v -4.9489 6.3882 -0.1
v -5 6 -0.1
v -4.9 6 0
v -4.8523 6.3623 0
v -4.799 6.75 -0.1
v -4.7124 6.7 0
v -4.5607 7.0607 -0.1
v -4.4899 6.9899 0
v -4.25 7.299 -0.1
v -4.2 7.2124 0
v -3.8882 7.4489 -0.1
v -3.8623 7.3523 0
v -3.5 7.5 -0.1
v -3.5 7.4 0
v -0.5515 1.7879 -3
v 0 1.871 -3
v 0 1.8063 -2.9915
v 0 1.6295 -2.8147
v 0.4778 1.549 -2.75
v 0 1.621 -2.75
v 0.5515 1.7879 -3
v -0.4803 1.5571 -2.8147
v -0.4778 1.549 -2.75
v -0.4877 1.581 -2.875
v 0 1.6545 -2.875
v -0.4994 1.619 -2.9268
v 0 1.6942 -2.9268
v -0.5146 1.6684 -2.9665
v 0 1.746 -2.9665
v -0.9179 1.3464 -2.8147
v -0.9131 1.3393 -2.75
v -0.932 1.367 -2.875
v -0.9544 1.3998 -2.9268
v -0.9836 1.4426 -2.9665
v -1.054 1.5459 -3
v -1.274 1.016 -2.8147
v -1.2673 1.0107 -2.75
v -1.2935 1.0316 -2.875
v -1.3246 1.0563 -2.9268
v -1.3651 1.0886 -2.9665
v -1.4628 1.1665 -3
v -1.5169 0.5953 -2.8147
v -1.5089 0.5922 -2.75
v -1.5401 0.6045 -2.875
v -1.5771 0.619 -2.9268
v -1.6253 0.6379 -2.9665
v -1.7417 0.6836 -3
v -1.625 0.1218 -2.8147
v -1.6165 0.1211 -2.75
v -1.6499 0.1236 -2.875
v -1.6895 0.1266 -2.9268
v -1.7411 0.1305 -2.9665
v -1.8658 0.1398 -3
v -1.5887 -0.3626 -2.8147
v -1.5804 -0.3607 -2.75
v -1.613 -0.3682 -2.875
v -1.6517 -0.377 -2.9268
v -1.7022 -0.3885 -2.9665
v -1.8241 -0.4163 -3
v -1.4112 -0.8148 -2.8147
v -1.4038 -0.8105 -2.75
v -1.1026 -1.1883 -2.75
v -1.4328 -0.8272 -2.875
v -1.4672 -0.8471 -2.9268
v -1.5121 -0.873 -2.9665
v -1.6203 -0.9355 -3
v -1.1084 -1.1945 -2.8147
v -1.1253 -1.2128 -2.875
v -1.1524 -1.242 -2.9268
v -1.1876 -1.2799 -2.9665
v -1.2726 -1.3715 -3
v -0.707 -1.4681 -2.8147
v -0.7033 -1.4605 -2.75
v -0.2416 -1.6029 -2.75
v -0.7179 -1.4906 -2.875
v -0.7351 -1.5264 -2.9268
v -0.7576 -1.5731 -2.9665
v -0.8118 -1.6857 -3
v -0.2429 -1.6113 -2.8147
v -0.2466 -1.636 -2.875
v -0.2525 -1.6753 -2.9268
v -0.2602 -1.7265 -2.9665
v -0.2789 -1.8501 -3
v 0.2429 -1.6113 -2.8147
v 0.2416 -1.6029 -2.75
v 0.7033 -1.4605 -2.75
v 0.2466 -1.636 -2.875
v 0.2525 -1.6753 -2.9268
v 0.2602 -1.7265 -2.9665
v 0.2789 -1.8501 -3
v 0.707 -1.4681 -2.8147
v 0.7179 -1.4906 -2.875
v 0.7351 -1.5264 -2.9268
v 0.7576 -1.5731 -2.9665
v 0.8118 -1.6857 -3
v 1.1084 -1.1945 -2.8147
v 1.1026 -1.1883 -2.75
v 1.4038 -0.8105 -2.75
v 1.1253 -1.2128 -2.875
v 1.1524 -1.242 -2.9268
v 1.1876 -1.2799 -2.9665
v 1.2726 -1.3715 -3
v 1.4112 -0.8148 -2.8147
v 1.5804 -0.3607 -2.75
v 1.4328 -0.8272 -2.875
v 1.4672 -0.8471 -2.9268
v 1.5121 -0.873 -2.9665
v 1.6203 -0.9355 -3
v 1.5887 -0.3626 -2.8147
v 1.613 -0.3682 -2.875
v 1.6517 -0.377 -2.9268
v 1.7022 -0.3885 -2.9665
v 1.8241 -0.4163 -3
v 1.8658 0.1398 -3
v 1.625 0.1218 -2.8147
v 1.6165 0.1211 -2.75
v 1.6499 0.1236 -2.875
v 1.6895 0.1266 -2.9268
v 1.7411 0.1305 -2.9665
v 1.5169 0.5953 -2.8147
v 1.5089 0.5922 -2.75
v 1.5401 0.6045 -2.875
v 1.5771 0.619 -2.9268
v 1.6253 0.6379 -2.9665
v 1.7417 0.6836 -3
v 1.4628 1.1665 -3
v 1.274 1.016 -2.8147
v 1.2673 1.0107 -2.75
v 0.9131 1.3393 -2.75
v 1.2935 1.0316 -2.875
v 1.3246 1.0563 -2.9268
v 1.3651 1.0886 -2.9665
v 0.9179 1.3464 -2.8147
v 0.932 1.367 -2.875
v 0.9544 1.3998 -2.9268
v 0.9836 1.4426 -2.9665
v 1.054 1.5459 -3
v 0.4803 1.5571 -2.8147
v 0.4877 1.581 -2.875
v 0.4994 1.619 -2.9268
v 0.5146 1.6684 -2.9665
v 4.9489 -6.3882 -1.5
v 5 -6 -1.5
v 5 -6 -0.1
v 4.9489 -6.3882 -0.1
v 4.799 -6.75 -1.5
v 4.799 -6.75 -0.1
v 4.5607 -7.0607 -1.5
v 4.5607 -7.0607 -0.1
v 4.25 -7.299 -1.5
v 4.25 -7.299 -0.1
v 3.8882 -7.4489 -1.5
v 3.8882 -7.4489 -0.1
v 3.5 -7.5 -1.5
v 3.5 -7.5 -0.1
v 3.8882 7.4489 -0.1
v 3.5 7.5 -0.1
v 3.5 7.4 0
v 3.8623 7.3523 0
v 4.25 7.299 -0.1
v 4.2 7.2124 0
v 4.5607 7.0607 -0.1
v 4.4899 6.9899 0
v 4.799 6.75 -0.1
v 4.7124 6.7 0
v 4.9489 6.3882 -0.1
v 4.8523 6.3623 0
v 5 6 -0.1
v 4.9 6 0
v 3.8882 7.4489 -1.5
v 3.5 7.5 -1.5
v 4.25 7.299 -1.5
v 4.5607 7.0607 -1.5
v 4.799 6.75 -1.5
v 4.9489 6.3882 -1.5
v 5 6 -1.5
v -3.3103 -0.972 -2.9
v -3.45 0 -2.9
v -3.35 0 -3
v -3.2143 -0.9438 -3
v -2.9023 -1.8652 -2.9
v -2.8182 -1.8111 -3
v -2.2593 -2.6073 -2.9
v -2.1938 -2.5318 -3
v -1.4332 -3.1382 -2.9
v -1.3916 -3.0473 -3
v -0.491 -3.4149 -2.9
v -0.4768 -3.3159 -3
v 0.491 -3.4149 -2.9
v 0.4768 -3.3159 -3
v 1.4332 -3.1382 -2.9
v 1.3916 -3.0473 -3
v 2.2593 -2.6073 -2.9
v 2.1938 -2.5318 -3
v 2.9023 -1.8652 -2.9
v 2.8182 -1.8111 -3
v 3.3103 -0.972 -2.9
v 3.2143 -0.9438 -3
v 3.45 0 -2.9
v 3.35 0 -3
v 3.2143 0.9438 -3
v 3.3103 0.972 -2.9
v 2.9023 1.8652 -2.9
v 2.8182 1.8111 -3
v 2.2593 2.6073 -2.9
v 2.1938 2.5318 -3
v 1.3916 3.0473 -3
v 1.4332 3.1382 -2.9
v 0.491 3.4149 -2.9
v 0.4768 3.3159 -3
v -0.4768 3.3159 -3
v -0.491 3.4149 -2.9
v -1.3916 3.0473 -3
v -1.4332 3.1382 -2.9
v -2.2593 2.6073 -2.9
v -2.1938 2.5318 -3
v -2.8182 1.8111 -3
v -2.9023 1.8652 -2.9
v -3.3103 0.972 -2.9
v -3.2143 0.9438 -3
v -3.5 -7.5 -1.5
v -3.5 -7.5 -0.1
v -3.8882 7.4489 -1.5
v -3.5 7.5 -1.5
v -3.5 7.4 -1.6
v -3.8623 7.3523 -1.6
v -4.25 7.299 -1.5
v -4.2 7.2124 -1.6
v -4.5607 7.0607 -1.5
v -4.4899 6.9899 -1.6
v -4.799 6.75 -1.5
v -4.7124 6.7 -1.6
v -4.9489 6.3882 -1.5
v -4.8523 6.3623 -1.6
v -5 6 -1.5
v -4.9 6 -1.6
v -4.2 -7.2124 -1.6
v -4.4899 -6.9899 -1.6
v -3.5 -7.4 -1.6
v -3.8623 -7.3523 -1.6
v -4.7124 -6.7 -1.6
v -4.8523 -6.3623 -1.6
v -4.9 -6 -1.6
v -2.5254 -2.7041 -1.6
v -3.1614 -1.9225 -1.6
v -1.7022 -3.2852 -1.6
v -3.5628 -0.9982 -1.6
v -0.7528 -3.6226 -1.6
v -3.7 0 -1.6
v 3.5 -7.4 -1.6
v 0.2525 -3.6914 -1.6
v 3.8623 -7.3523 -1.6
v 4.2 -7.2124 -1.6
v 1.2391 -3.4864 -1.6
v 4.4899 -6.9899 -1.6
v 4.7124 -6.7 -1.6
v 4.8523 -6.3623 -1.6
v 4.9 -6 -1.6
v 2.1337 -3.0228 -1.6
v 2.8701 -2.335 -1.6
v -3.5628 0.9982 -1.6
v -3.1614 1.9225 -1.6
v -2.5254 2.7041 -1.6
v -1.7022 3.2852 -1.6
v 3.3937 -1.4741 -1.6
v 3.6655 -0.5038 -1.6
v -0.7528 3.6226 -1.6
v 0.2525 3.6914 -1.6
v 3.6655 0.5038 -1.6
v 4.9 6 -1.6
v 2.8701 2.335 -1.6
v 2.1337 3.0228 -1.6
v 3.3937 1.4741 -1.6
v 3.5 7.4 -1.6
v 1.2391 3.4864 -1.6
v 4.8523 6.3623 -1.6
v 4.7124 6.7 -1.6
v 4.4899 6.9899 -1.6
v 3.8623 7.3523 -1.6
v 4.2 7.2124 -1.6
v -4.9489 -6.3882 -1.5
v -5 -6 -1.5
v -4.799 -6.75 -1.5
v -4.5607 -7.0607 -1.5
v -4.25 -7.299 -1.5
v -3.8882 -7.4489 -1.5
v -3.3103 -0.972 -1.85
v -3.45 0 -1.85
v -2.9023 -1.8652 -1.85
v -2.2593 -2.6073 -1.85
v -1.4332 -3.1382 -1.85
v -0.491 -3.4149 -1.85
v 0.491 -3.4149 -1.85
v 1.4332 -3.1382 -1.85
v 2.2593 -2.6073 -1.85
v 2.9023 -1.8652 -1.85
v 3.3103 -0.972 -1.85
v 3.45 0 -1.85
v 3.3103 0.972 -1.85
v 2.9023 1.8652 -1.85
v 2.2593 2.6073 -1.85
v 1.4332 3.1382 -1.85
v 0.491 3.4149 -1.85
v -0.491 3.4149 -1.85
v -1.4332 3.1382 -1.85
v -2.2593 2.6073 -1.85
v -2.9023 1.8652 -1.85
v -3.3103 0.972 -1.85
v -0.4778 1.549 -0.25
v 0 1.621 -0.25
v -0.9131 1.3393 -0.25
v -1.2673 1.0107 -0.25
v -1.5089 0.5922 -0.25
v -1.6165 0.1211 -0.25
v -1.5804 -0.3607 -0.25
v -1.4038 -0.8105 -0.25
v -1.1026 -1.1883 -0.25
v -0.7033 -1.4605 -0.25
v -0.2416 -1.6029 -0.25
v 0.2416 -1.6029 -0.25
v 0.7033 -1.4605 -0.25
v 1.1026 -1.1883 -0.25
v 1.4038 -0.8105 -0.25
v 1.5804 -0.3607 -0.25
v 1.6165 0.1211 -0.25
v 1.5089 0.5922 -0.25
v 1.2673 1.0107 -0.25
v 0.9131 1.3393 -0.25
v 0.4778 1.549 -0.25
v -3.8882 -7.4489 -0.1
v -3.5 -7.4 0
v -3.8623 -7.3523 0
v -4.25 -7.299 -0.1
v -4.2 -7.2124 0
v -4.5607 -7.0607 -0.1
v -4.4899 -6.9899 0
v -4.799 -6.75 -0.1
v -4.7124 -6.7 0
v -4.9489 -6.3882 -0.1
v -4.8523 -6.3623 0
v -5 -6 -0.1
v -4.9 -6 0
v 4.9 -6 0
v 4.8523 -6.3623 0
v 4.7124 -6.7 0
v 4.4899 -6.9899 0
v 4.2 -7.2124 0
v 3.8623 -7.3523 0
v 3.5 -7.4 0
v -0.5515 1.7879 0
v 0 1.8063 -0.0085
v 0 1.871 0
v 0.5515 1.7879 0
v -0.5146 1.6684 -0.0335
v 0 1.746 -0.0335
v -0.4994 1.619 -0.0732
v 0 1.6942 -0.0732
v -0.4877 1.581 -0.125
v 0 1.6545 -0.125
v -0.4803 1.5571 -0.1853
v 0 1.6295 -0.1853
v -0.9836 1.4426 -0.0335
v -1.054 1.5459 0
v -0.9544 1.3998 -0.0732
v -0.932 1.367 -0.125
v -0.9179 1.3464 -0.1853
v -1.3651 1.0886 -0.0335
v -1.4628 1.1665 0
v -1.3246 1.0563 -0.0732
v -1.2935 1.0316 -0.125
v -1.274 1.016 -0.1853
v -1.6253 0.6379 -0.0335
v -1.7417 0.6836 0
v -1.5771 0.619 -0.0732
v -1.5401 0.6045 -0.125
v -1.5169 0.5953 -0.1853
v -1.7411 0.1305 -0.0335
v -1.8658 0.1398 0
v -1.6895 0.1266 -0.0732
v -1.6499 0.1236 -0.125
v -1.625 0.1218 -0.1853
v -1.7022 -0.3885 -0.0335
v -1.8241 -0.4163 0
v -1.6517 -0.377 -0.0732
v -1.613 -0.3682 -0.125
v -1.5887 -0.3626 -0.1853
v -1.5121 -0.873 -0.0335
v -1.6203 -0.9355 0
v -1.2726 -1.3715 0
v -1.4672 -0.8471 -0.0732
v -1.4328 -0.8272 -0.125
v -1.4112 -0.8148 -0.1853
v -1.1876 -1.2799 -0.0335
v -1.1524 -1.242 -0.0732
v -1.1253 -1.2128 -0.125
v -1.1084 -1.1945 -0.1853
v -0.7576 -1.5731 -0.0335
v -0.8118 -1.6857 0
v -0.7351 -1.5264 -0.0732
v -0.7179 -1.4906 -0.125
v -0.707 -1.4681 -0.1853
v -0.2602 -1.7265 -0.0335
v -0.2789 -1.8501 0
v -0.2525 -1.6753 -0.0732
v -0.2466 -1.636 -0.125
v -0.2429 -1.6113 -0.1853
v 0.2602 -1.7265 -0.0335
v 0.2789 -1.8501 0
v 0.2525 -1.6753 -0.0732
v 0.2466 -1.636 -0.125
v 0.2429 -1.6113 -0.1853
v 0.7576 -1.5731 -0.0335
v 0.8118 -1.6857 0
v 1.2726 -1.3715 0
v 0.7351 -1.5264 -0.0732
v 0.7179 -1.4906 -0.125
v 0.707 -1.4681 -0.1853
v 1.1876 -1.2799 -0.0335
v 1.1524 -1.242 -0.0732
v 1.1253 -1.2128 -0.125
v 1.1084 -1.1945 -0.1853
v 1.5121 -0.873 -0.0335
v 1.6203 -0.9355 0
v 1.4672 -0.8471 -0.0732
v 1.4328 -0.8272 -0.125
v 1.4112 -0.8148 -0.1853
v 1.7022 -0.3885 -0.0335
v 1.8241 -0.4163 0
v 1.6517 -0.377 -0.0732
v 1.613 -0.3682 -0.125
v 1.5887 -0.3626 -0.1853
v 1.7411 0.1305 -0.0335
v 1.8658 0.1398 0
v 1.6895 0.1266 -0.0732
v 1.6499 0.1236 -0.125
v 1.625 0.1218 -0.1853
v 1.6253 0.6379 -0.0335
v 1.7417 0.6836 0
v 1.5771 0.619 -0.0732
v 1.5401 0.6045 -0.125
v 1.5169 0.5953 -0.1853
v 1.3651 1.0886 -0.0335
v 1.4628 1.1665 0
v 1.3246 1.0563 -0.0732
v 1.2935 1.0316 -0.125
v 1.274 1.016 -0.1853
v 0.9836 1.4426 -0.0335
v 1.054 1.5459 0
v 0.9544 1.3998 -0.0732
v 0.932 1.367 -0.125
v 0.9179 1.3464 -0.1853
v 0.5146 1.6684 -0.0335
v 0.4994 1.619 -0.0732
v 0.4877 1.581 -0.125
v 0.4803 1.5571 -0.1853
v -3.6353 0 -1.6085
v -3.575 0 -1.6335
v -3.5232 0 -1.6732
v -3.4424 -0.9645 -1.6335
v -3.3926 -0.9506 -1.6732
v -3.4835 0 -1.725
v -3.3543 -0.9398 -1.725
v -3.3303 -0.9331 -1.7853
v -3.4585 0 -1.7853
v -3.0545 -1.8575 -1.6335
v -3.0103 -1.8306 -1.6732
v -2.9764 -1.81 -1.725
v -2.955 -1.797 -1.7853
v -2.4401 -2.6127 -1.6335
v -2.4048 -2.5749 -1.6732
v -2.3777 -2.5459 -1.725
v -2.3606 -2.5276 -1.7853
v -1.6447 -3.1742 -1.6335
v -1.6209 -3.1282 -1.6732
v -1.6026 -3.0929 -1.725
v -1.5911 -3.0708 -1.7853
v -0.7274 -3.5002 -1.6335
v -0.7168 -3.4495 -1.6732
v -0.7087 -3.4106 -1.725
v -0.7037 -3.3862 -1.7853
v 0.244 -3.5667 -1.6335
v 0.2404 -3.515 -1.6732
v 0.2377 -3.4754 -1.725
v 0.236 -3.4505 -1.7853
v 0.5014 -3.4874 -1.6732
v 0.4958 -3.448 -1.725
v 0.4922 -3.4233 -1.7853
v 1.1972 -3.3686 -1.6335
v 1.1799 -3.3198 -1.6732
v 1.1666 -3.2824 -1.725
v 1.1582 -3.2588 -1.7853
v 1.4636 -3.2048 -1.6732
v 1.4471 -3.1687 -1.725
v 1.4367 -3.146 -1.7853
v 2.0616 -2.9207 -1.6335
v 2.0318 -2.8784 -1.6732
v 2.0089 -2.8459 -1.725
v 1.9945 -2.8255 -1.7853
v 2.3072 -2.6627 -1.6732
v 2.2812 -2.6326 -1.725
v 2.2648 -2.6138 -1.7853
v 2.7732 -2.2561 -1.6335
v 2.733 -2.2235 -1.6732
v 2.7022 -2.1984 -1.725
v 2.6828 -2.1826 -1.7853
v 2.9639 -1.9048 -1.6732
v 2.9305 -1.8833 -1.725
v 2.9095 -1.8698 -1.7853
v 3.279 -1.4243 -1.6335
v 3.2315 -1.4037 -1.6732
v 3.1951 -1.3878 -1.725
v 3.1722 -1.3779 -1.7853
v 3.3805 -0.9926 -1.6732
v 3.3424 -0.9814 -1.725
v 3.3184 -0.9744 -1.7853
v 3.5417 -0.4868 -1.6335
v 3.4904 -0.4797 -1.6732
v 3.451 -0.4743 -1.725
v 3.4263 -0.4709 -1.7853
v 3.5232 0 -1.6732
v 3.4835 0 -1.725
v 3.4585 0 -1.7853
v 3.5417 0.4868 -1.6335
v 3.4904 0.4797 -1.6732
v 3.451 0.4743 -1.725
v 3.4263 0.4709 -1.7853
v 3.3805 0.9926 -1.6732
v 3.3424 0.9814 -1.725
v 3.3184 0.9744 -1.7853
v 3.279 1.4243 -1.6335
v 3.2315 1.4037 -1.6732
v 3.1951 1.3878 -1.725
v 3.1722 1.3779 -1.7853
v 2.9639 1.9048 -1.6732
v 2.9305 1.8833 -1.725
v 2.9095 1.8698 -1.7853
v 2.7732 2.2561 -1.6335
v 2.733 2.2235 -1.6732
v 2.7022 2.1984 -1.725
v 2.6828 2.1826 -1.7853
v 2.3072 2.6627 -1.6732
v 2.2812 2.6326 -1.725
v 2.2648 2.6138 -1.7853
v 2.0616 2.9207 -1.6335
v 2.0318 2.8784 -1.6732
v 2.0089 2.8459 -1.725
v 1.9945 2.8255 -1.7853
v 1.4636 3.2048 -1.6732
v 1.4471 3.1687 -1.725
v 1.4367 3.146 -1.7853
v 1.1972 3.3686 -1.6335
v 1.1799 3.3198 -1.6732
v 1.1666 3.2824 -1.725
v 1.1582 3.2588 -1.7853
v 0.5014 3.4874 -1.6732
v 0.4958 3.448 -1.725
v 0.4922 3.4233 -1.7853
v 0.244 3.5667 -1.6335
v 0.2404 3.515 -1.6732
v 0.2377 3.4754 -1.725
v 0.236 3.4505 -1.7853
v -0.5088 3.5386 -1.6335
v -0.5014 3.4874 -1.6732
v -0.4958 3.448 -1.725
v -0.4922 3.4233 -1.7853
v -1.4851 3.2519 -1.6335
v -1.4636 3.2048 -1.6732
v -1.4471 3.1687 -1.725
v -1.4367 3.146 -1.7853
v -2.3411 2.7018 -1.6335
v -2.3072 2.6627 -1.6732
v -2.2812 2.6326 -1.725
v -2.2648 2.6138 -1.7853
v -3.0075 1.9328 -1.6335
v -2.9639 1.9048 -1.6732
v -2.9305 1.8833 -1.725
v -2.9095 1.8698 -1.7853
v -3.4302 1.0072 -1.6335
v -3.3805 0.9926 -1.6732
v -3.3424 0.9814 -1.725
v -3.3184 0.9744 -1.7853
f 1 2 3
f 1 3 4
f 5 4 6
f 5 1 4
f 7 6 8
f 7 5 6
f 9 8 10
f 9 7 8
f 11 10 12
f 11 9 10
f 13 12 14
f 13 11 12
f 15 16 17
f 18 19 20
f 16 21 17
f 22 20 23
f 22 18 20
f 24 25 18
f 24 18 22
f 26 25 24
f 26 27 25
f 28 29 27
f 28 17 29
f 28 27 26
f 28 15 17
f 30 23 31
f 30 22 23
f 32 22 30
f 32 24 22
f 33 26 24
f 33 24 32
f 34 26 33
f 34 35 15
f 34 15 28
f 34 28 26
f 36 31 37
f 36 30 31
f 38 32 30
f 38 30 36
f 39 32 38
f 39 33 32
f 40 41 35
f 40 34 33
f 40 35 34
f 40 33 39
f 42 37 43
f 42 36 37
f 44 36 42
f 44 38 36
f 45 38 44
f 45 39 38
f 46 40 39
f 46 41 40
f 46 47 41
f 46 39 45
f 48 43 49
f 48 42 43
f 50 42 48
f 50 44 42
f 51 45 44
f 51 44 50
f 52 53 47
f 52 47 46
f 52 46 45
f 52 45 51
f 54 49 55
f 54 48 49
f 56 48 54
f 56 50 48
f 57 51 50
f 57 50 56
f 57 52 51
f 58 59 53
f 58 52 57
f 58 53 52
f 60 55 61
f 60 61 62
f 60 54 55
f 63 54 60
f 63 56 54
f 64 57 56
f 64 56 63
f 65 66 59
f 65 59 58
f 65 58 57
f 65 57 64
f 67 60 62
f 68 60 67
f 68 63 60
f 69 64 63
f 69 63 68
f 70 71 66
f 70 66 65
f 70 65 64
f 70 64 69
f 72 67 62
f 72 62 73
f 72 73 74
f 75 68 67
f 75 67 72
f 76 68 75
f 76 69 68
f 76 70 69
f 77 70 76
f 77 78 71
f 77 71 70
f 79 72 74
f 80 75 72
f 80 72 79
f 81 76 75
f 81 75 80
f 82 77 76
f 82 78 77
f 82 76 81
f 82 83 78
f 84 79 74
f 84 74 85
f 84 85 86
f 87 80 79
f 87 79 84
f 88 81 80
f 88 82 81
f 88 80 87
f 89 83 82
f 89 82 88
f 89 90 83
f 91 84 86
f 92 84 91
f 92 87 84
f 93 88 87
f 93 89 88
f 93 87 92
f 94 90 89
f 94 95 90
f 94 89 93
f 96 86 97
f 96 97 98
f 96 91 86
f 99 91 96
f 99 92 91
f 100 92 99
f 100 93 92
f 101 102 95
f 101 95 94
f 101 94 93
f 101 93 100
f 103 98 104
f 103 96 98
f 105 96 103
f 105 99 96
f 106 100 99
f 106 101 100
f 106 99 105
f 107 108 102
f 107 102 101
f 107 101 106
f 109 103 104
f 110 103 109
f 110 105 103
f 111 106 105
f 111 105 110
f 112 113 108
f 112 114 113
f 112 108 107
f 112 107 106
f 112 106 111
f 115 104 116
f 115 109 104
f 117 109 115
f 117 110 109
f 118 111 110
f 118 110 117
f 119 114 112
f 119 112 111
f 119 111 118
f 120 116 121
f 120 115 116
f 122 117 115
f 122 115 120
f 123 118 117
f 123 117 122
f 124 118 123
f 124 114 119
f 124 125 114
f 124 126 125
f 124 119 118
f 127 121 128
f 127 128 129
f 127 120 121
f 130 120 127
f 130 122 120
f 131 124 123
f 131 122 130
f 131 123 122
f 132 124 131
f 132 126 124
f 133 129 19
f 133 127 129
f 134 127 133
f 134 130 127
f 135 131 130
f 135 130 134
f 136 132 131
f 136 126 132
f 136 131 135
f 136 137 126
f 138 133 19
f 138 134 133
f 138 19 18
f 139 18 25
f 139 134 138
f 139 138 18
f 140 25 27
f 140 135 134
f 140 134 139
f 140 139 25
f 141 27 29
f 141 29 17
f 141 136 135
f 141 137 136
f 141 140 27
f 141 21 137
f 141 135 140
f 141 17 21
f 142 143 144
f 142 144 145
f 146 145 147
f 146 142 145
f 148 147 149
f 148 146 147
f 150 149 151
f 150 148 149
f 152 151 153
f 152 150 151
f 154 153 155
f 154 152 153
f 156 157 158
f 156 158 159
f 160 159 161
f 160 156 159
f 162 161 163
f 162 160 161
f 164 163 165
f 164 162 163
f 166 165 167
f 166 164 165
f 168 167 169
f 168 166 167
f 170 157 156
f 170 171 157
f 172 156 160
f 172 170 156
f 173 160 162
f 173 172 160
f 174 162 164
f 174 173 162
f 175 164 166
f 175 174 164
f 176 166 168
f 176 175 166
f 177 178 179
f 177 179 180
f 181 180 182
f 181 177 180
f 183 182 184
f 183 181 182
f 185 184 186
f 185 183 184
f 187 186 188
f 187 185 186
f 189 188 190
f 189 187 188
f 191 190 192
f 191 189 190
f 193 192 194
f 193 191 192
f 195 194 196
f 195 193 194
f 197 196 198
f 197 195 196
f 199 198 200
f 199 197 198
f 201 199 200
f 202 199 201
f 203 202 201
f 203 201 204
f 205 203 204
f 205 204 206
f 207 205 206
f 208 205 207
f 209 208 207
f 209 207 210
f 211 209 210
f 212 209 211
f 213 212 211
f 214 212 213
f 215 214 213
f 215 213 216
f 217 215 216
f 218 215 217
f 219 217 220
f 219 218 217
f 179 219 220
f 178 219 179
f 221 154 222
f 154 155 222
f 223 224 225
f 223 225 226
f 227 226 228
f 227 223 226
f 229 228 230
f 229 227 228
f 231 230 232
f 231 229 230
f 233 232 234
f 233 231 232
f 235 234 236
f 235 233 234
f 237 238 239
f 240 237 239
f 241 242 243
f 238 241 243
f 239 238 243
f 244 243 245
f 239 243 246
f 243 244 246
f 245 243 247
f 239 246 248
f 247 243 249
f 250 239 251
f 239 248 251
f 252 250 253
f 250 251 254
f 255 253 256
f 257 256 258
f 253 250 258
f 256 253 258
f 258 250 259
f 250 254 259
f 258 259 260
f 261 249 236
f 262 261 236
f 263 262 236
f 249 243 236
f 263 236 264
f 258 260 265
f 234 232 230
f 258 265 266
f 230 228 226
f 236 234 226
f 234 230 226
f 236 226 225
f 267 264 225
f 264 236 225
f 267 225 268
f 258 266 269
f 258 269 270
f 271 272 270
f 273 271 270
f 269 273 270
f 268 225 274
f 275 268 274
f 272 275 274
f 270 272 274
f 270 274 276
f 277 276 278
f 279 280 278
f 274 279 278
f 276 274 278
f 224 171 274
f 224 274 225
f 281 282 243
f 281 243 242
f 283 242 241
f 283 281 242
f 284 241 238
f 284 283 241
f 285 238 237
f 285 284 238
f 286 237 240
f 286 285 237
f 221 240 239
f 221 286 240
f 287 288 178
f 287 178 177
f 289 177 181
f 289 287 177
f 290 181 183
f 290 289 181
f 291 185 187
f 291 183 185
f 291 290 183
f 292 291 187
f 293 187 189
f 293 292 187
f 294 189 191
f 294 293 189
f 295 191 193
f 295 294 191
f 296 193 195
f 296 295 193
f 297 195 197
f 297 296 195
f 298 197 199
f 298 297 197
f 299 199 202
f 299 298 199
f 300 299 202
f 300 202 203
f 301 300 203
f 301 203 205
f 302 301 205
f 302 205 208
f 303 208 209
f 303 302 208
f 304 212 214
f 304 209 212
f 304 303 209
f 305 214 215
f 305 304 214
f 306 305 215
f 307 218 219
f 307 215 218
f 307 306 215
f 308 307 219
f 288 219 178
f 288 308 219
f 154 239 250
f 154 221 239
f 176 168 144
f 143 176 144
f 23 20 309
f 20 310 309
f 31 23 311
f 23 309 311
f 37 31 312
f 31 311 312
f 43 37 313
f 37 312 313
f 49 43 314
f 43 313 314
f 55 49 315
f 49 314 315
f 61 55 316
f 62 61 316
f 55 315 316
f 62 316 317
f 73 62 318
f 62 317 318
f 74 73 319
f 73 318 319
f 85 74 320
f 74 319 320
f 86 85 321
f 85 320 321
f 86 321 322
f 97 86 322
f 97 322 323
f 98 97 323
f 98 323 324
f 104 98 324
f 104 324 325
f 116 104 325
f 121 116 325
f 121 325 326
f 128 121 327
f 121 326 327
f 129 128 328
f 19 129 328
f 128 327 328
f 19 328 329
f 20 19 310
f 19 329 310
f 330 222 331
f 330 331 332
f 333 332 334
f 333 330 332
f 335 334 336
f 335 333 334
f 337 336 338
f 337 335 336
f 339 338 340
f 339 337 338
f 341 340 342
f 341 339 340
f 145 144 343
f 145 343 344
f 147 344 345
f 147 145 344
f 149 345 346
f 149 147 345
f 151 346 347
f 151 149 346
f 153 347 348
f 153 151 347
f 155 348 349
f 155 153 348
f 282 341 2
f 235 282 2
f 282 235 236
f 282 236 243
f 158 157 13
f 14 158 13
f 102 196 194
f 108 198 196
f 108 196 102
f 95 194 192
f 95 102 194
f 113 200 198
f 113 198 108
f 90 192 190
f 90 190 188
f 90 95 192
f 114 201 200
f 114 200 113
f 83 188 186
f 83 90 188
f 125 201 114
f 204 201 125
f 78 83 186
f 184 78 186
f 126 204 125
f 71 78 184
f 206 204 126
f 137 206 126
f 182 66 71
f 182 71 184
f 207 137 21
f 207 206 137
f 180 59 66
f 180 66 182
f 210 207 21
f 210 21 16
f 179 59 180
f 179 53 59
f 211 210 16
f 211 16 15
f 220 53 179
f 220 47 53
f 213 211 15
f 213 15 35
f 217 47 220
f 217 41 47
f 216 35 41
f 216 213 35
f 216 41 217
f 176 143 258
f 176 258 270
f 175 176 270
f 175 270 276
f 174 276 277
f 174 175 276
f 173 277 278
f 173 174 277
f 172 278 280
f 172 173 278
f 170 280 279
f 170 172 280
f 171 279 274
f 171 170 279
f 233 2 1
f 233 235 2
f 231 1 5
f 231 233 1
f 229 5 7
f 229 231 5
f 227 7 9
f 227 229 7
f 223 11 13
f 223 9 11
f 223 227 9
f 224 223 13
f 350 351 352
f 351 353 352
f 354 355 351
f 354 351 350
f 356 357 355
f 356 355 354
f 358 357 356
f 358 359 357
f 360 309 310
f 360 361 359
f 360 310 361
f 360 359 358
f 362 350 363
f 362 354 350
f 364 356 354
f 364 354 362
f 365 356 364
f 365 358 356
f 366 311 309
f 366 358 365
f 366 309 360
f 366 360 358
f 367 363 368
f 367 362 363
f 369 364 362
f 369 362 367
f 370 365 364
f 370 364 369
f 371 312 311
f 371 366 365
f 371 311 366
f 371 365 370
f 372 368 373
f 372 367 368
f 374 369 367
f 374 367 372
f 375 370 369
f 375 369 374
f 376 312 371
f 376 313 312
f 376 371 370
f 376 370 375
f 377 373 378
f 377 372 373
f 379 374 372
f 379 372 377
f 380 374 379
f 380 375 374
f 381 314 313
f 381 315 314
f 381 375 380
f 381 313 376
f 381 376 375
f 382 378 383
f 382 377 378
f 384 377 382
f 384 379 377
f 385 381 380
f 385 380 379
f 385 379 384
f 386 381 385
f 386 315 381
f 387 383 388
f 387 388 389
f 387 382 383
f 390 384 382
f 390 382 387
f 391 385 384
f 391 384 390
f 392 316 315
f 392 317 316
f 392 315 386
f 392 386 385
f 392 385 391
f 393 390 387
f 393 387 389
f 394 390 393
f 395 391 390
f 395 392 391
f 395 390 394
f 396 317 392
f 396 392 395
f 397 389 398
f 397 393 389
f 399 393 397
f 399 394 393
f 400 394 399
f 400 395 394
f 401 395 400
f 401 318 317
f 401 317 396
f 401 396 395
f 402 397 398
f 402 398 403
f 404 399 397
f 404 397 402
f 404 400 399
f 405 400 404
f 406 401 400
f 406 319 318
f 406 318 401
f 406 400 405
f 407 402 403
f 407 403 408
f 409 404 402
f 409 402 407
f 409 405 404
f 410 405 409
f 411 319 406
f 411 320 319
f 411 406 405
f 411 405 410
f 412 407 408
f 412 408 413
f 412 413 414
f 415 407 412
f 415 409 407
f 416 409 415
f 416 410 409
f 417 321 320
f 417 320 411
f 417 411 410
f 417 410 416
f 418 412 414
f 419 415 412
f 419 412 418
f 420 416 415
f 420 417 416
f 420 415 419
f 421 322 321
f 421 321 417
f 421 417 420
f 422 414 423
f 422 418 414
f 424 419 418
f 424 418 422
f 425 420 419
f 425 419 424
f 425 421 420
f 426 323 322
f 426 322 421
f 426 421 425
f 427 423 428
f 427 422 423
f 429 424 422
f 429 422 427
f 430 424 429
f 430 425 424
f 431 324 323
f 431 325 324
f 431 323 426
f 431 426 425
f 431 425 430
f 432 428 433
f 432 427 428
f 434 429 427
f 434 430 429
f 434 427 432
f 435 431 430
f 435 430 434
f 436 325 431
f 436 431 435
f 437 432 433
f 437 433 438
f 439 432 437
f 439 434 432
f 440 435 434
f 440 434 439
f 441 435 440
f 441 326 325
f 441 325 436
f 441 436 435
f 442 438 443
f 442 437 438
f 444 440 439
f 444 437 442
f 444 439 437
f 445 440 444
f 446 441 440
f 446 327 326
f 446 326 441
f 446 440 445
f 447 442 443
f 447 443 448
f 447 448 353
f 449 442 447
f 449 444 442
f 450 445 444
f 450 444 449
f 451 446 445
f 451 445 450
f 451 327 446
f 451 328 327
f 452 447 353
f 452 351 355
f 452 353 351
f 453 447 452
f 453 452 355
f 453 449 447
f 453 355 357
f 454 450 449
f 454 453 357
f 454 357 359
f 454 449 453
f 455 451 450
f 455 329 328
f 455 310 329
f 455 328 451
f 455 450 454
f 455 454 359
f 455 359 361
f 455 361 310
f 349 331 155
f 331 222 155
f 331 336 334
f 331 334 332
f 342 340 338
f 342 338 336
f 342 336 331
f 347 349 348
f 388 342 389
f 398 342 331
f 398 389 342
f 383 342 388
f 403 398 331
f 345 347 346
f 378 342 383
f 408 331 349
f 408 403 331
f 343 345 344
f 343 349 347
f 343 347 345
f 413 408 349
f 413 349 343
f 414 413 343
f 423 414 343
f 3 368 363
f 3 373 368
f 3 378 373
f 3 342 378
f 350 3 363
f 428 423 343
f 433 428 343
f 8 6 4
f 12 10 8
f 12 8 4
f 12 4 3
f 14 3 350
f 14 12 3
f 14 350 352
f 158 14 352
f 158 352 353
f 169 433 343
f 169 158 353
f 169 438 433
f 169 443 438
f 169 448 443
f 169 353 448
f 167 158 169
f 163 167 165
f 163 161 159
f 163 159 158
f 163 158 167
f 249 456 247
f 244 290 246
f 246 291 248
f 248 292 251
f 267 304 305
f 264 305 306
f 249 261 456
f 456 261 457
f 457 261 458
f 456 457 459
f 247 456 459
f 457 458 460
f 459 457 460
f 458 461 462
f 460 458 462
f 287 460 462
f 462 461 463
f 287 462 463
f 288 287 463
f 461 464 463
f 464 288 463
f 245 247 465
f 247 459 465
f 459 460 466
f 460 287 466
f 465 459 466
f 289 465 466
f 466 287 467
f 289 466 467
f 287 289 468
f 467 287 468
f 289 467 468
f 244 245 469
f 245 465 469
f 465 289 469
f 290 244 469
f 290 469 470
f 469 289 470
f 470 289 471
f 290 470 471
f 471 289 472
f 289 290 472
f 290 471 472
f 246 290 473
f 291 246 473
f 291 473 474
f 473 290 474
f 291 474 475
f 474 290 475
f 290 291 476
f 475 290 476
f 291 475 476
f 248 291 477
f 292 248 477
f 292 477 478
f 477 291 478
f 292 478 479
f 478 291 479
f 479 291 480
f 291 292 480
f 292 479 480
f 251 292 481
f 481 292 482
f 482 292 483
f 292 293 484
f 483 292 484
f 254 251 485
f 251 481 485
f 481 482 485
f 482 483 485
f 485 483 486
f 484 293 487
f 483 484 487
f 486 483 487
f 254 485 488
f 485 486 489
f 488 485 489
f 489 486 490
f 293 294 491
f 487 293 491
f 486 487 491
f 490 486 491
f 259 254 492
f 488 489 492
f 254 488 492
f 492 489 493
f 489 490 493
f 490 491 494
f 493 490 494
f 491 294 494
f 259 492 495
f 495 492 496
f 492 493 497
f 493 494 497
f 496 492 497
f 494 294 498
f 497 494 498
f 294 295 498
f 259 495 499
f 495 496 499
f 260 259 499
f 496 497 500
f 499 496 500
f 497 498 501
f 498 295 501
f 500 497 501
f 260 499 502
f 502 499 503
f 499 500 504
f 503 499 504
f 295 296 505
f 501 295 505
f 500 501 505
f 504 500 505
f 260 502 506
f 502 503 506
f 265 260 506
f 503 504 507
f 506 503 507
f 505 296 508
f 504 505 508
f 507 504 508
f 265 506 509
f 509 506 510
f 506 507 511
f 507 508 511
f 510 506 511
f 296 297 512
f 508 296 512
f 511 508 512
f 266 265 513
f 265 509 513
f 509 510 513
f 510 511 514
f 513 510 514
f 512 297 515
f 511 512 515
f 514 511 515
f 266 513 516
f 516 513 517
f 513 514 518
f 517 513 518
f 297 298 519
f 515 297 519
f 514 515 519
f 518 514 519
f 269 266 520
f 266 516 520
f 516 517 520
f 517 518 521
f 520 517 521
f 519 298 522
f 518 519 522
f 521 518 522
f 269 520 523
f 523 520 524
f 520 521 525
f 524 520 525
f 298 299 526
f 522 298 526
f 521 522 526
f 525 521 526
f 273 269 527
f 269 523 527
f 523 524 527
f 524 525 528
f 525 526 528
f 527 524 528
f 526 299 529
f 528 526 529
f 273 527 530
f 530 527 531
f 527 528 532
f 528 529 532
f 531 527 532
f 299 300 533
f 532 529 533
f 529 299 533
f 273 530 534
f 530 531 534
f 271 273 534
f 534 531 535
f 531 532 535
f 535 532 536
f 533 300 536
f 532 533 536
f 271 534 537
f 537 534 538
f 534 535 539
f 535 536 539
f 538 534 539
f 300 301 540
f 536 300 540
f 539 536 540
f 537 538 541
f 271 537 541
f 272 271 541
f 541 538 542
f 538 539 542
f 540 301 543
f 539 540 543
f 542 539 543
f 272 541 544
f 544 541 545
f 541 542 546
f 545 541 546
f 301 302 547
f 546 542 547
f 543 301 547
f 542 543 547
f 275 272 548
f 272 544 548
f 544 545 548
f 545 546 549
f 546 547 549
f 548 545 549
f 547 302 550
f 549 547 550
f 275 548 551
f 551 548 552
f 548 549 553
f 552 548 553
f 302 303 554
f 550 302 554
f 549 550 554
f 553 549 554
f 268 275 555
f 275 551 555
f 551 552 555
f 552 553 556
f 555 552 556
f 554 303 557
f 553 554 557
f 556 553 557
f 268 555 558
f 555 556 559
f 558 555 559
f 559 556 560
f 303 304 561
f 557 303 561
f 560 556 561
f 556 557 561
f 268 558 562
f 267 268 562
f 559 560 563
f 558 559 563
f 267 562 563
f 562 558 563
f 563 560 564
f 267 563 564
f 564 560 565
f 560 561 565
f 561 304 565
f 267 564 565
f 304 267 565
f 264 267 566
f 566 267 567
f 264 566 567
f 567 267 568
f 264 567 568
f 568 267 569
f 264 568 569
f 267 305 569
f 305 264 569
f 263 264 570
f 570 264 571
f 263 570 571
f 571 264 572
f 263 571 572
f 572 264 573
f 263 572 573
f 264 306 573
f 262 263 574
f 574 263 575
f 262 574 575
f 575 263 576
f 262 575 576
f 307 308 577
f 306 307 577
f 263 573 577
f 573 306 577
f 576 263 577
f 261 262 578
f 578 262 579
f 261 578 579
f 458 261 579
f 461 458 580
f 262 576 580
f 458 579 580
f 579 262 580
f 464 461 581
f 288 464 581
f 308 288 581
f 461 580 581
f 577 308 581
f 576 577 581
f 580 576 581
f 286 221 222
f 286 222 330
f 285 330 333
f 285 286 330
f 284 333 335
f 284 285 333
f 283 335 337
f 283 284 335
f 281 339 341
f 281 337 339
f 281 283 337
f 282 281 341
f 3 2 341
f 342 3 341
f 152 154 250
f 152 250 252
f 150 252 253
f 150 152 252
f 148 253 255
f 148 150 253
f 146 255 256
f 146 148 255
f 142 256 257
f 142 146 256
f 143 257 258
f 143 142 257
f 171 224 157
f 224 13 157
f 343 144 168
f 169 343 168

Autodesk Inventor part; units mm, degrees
ref_plane "YZ Plane" through (0, 0, 0) normal (1, 0, 0) x (0, 1, 0)
ref_plane "XZ Plane" through (0, 0, 0) normal (0, 1, 0) x (-1, 0, 0)
ref_plane "XY Plane" through (0, 0, 0) normal (0, 0, 1) x (1, 0, 0)
sketch "Sketch1" plane through (0, 0, 0) normal (0, 0, 1) x (1, 0, 0)
  line L0 (5, -7.5) -> (-5, -7.5)
  line L1 (-5, -7.5) -> (-5, 7.5)
  line L2 (-5, 7.5) -> (5, 7.5)
  line L3 (5, 7.5) -> (5, -7.5)
  line L4 (5, -7.5) -> (-5, 7.5) construction
  line L5 (-5, -7.5) -> (5, 7.5) construction
  point P0 (0, 0)
  dimension "d0" = 10
  dimension "d1" = 15
extrude "Extrusion1" add sketch "Sketch1" against normal blind 1.6
sketch "Sketch2" plane through (0, 0, -1.6) normal (0, 0, -1) x (-1, 0, 0)
  circle A0 centre (0, 0) radius 3.45
  dimension "d4" = 6.9
extrude "Extrusion2" add sketch "Sketch2" along normal blind 1.4
fillet "Fillet1" radius 0.25 1 edges at (3.45, 0, -1.6)
fillet "Fillet2" radius 1.5 4 edges at (5, 7.5, -0.8) (-5, 7.5, -0.8) (-5, -7.5, -0.8) (5, -7.5, -0.8)
sketch "Sketch3" plane through (0, 0, -3) normal (0, 0, -1) x (-1, 0, 0)
  circle A0 centre (0, 0) radius 3.45 projected
hole "Hole1" at (0, 0, -3) direction (0, 0, 1) diameter 3.242 end through all thread size "M4x0.7" class "6H" standard "ANSI Metric M Profile"
fillet "Fillet3" radius 0.25 2 edges at (0, -1.621, 0) (0, -1.621, -3)
chamfer "Chamfer1" distance 0.1 angle 45 1 edges at (3.45, 0, -3)
chamfer "Chamfer2" distance 0.1 angle 45 16 edges at (4.5607, 7.0607, 0) (5, 0, 0) (4.5607, -7.0607, 0) (0, -7.5, 0) (-4.5607, -7.0607, 0) (-5, 0, 0) (-4.5607, 7.0607, 0) (0, 7.5, 0) (4.5607, 7.0607, -1.6) (0, 7.5, -1.6) (-4.5607, 7.0607, -1.6) (-5, 0, -1.6) (-4.5607, -7.0607, -1.6) (0, -7.5, -1.6) (4.5607, -7.0607, -1.6) (5, 0, -1.6)
properties part number "M4 T SLOT NUT"
